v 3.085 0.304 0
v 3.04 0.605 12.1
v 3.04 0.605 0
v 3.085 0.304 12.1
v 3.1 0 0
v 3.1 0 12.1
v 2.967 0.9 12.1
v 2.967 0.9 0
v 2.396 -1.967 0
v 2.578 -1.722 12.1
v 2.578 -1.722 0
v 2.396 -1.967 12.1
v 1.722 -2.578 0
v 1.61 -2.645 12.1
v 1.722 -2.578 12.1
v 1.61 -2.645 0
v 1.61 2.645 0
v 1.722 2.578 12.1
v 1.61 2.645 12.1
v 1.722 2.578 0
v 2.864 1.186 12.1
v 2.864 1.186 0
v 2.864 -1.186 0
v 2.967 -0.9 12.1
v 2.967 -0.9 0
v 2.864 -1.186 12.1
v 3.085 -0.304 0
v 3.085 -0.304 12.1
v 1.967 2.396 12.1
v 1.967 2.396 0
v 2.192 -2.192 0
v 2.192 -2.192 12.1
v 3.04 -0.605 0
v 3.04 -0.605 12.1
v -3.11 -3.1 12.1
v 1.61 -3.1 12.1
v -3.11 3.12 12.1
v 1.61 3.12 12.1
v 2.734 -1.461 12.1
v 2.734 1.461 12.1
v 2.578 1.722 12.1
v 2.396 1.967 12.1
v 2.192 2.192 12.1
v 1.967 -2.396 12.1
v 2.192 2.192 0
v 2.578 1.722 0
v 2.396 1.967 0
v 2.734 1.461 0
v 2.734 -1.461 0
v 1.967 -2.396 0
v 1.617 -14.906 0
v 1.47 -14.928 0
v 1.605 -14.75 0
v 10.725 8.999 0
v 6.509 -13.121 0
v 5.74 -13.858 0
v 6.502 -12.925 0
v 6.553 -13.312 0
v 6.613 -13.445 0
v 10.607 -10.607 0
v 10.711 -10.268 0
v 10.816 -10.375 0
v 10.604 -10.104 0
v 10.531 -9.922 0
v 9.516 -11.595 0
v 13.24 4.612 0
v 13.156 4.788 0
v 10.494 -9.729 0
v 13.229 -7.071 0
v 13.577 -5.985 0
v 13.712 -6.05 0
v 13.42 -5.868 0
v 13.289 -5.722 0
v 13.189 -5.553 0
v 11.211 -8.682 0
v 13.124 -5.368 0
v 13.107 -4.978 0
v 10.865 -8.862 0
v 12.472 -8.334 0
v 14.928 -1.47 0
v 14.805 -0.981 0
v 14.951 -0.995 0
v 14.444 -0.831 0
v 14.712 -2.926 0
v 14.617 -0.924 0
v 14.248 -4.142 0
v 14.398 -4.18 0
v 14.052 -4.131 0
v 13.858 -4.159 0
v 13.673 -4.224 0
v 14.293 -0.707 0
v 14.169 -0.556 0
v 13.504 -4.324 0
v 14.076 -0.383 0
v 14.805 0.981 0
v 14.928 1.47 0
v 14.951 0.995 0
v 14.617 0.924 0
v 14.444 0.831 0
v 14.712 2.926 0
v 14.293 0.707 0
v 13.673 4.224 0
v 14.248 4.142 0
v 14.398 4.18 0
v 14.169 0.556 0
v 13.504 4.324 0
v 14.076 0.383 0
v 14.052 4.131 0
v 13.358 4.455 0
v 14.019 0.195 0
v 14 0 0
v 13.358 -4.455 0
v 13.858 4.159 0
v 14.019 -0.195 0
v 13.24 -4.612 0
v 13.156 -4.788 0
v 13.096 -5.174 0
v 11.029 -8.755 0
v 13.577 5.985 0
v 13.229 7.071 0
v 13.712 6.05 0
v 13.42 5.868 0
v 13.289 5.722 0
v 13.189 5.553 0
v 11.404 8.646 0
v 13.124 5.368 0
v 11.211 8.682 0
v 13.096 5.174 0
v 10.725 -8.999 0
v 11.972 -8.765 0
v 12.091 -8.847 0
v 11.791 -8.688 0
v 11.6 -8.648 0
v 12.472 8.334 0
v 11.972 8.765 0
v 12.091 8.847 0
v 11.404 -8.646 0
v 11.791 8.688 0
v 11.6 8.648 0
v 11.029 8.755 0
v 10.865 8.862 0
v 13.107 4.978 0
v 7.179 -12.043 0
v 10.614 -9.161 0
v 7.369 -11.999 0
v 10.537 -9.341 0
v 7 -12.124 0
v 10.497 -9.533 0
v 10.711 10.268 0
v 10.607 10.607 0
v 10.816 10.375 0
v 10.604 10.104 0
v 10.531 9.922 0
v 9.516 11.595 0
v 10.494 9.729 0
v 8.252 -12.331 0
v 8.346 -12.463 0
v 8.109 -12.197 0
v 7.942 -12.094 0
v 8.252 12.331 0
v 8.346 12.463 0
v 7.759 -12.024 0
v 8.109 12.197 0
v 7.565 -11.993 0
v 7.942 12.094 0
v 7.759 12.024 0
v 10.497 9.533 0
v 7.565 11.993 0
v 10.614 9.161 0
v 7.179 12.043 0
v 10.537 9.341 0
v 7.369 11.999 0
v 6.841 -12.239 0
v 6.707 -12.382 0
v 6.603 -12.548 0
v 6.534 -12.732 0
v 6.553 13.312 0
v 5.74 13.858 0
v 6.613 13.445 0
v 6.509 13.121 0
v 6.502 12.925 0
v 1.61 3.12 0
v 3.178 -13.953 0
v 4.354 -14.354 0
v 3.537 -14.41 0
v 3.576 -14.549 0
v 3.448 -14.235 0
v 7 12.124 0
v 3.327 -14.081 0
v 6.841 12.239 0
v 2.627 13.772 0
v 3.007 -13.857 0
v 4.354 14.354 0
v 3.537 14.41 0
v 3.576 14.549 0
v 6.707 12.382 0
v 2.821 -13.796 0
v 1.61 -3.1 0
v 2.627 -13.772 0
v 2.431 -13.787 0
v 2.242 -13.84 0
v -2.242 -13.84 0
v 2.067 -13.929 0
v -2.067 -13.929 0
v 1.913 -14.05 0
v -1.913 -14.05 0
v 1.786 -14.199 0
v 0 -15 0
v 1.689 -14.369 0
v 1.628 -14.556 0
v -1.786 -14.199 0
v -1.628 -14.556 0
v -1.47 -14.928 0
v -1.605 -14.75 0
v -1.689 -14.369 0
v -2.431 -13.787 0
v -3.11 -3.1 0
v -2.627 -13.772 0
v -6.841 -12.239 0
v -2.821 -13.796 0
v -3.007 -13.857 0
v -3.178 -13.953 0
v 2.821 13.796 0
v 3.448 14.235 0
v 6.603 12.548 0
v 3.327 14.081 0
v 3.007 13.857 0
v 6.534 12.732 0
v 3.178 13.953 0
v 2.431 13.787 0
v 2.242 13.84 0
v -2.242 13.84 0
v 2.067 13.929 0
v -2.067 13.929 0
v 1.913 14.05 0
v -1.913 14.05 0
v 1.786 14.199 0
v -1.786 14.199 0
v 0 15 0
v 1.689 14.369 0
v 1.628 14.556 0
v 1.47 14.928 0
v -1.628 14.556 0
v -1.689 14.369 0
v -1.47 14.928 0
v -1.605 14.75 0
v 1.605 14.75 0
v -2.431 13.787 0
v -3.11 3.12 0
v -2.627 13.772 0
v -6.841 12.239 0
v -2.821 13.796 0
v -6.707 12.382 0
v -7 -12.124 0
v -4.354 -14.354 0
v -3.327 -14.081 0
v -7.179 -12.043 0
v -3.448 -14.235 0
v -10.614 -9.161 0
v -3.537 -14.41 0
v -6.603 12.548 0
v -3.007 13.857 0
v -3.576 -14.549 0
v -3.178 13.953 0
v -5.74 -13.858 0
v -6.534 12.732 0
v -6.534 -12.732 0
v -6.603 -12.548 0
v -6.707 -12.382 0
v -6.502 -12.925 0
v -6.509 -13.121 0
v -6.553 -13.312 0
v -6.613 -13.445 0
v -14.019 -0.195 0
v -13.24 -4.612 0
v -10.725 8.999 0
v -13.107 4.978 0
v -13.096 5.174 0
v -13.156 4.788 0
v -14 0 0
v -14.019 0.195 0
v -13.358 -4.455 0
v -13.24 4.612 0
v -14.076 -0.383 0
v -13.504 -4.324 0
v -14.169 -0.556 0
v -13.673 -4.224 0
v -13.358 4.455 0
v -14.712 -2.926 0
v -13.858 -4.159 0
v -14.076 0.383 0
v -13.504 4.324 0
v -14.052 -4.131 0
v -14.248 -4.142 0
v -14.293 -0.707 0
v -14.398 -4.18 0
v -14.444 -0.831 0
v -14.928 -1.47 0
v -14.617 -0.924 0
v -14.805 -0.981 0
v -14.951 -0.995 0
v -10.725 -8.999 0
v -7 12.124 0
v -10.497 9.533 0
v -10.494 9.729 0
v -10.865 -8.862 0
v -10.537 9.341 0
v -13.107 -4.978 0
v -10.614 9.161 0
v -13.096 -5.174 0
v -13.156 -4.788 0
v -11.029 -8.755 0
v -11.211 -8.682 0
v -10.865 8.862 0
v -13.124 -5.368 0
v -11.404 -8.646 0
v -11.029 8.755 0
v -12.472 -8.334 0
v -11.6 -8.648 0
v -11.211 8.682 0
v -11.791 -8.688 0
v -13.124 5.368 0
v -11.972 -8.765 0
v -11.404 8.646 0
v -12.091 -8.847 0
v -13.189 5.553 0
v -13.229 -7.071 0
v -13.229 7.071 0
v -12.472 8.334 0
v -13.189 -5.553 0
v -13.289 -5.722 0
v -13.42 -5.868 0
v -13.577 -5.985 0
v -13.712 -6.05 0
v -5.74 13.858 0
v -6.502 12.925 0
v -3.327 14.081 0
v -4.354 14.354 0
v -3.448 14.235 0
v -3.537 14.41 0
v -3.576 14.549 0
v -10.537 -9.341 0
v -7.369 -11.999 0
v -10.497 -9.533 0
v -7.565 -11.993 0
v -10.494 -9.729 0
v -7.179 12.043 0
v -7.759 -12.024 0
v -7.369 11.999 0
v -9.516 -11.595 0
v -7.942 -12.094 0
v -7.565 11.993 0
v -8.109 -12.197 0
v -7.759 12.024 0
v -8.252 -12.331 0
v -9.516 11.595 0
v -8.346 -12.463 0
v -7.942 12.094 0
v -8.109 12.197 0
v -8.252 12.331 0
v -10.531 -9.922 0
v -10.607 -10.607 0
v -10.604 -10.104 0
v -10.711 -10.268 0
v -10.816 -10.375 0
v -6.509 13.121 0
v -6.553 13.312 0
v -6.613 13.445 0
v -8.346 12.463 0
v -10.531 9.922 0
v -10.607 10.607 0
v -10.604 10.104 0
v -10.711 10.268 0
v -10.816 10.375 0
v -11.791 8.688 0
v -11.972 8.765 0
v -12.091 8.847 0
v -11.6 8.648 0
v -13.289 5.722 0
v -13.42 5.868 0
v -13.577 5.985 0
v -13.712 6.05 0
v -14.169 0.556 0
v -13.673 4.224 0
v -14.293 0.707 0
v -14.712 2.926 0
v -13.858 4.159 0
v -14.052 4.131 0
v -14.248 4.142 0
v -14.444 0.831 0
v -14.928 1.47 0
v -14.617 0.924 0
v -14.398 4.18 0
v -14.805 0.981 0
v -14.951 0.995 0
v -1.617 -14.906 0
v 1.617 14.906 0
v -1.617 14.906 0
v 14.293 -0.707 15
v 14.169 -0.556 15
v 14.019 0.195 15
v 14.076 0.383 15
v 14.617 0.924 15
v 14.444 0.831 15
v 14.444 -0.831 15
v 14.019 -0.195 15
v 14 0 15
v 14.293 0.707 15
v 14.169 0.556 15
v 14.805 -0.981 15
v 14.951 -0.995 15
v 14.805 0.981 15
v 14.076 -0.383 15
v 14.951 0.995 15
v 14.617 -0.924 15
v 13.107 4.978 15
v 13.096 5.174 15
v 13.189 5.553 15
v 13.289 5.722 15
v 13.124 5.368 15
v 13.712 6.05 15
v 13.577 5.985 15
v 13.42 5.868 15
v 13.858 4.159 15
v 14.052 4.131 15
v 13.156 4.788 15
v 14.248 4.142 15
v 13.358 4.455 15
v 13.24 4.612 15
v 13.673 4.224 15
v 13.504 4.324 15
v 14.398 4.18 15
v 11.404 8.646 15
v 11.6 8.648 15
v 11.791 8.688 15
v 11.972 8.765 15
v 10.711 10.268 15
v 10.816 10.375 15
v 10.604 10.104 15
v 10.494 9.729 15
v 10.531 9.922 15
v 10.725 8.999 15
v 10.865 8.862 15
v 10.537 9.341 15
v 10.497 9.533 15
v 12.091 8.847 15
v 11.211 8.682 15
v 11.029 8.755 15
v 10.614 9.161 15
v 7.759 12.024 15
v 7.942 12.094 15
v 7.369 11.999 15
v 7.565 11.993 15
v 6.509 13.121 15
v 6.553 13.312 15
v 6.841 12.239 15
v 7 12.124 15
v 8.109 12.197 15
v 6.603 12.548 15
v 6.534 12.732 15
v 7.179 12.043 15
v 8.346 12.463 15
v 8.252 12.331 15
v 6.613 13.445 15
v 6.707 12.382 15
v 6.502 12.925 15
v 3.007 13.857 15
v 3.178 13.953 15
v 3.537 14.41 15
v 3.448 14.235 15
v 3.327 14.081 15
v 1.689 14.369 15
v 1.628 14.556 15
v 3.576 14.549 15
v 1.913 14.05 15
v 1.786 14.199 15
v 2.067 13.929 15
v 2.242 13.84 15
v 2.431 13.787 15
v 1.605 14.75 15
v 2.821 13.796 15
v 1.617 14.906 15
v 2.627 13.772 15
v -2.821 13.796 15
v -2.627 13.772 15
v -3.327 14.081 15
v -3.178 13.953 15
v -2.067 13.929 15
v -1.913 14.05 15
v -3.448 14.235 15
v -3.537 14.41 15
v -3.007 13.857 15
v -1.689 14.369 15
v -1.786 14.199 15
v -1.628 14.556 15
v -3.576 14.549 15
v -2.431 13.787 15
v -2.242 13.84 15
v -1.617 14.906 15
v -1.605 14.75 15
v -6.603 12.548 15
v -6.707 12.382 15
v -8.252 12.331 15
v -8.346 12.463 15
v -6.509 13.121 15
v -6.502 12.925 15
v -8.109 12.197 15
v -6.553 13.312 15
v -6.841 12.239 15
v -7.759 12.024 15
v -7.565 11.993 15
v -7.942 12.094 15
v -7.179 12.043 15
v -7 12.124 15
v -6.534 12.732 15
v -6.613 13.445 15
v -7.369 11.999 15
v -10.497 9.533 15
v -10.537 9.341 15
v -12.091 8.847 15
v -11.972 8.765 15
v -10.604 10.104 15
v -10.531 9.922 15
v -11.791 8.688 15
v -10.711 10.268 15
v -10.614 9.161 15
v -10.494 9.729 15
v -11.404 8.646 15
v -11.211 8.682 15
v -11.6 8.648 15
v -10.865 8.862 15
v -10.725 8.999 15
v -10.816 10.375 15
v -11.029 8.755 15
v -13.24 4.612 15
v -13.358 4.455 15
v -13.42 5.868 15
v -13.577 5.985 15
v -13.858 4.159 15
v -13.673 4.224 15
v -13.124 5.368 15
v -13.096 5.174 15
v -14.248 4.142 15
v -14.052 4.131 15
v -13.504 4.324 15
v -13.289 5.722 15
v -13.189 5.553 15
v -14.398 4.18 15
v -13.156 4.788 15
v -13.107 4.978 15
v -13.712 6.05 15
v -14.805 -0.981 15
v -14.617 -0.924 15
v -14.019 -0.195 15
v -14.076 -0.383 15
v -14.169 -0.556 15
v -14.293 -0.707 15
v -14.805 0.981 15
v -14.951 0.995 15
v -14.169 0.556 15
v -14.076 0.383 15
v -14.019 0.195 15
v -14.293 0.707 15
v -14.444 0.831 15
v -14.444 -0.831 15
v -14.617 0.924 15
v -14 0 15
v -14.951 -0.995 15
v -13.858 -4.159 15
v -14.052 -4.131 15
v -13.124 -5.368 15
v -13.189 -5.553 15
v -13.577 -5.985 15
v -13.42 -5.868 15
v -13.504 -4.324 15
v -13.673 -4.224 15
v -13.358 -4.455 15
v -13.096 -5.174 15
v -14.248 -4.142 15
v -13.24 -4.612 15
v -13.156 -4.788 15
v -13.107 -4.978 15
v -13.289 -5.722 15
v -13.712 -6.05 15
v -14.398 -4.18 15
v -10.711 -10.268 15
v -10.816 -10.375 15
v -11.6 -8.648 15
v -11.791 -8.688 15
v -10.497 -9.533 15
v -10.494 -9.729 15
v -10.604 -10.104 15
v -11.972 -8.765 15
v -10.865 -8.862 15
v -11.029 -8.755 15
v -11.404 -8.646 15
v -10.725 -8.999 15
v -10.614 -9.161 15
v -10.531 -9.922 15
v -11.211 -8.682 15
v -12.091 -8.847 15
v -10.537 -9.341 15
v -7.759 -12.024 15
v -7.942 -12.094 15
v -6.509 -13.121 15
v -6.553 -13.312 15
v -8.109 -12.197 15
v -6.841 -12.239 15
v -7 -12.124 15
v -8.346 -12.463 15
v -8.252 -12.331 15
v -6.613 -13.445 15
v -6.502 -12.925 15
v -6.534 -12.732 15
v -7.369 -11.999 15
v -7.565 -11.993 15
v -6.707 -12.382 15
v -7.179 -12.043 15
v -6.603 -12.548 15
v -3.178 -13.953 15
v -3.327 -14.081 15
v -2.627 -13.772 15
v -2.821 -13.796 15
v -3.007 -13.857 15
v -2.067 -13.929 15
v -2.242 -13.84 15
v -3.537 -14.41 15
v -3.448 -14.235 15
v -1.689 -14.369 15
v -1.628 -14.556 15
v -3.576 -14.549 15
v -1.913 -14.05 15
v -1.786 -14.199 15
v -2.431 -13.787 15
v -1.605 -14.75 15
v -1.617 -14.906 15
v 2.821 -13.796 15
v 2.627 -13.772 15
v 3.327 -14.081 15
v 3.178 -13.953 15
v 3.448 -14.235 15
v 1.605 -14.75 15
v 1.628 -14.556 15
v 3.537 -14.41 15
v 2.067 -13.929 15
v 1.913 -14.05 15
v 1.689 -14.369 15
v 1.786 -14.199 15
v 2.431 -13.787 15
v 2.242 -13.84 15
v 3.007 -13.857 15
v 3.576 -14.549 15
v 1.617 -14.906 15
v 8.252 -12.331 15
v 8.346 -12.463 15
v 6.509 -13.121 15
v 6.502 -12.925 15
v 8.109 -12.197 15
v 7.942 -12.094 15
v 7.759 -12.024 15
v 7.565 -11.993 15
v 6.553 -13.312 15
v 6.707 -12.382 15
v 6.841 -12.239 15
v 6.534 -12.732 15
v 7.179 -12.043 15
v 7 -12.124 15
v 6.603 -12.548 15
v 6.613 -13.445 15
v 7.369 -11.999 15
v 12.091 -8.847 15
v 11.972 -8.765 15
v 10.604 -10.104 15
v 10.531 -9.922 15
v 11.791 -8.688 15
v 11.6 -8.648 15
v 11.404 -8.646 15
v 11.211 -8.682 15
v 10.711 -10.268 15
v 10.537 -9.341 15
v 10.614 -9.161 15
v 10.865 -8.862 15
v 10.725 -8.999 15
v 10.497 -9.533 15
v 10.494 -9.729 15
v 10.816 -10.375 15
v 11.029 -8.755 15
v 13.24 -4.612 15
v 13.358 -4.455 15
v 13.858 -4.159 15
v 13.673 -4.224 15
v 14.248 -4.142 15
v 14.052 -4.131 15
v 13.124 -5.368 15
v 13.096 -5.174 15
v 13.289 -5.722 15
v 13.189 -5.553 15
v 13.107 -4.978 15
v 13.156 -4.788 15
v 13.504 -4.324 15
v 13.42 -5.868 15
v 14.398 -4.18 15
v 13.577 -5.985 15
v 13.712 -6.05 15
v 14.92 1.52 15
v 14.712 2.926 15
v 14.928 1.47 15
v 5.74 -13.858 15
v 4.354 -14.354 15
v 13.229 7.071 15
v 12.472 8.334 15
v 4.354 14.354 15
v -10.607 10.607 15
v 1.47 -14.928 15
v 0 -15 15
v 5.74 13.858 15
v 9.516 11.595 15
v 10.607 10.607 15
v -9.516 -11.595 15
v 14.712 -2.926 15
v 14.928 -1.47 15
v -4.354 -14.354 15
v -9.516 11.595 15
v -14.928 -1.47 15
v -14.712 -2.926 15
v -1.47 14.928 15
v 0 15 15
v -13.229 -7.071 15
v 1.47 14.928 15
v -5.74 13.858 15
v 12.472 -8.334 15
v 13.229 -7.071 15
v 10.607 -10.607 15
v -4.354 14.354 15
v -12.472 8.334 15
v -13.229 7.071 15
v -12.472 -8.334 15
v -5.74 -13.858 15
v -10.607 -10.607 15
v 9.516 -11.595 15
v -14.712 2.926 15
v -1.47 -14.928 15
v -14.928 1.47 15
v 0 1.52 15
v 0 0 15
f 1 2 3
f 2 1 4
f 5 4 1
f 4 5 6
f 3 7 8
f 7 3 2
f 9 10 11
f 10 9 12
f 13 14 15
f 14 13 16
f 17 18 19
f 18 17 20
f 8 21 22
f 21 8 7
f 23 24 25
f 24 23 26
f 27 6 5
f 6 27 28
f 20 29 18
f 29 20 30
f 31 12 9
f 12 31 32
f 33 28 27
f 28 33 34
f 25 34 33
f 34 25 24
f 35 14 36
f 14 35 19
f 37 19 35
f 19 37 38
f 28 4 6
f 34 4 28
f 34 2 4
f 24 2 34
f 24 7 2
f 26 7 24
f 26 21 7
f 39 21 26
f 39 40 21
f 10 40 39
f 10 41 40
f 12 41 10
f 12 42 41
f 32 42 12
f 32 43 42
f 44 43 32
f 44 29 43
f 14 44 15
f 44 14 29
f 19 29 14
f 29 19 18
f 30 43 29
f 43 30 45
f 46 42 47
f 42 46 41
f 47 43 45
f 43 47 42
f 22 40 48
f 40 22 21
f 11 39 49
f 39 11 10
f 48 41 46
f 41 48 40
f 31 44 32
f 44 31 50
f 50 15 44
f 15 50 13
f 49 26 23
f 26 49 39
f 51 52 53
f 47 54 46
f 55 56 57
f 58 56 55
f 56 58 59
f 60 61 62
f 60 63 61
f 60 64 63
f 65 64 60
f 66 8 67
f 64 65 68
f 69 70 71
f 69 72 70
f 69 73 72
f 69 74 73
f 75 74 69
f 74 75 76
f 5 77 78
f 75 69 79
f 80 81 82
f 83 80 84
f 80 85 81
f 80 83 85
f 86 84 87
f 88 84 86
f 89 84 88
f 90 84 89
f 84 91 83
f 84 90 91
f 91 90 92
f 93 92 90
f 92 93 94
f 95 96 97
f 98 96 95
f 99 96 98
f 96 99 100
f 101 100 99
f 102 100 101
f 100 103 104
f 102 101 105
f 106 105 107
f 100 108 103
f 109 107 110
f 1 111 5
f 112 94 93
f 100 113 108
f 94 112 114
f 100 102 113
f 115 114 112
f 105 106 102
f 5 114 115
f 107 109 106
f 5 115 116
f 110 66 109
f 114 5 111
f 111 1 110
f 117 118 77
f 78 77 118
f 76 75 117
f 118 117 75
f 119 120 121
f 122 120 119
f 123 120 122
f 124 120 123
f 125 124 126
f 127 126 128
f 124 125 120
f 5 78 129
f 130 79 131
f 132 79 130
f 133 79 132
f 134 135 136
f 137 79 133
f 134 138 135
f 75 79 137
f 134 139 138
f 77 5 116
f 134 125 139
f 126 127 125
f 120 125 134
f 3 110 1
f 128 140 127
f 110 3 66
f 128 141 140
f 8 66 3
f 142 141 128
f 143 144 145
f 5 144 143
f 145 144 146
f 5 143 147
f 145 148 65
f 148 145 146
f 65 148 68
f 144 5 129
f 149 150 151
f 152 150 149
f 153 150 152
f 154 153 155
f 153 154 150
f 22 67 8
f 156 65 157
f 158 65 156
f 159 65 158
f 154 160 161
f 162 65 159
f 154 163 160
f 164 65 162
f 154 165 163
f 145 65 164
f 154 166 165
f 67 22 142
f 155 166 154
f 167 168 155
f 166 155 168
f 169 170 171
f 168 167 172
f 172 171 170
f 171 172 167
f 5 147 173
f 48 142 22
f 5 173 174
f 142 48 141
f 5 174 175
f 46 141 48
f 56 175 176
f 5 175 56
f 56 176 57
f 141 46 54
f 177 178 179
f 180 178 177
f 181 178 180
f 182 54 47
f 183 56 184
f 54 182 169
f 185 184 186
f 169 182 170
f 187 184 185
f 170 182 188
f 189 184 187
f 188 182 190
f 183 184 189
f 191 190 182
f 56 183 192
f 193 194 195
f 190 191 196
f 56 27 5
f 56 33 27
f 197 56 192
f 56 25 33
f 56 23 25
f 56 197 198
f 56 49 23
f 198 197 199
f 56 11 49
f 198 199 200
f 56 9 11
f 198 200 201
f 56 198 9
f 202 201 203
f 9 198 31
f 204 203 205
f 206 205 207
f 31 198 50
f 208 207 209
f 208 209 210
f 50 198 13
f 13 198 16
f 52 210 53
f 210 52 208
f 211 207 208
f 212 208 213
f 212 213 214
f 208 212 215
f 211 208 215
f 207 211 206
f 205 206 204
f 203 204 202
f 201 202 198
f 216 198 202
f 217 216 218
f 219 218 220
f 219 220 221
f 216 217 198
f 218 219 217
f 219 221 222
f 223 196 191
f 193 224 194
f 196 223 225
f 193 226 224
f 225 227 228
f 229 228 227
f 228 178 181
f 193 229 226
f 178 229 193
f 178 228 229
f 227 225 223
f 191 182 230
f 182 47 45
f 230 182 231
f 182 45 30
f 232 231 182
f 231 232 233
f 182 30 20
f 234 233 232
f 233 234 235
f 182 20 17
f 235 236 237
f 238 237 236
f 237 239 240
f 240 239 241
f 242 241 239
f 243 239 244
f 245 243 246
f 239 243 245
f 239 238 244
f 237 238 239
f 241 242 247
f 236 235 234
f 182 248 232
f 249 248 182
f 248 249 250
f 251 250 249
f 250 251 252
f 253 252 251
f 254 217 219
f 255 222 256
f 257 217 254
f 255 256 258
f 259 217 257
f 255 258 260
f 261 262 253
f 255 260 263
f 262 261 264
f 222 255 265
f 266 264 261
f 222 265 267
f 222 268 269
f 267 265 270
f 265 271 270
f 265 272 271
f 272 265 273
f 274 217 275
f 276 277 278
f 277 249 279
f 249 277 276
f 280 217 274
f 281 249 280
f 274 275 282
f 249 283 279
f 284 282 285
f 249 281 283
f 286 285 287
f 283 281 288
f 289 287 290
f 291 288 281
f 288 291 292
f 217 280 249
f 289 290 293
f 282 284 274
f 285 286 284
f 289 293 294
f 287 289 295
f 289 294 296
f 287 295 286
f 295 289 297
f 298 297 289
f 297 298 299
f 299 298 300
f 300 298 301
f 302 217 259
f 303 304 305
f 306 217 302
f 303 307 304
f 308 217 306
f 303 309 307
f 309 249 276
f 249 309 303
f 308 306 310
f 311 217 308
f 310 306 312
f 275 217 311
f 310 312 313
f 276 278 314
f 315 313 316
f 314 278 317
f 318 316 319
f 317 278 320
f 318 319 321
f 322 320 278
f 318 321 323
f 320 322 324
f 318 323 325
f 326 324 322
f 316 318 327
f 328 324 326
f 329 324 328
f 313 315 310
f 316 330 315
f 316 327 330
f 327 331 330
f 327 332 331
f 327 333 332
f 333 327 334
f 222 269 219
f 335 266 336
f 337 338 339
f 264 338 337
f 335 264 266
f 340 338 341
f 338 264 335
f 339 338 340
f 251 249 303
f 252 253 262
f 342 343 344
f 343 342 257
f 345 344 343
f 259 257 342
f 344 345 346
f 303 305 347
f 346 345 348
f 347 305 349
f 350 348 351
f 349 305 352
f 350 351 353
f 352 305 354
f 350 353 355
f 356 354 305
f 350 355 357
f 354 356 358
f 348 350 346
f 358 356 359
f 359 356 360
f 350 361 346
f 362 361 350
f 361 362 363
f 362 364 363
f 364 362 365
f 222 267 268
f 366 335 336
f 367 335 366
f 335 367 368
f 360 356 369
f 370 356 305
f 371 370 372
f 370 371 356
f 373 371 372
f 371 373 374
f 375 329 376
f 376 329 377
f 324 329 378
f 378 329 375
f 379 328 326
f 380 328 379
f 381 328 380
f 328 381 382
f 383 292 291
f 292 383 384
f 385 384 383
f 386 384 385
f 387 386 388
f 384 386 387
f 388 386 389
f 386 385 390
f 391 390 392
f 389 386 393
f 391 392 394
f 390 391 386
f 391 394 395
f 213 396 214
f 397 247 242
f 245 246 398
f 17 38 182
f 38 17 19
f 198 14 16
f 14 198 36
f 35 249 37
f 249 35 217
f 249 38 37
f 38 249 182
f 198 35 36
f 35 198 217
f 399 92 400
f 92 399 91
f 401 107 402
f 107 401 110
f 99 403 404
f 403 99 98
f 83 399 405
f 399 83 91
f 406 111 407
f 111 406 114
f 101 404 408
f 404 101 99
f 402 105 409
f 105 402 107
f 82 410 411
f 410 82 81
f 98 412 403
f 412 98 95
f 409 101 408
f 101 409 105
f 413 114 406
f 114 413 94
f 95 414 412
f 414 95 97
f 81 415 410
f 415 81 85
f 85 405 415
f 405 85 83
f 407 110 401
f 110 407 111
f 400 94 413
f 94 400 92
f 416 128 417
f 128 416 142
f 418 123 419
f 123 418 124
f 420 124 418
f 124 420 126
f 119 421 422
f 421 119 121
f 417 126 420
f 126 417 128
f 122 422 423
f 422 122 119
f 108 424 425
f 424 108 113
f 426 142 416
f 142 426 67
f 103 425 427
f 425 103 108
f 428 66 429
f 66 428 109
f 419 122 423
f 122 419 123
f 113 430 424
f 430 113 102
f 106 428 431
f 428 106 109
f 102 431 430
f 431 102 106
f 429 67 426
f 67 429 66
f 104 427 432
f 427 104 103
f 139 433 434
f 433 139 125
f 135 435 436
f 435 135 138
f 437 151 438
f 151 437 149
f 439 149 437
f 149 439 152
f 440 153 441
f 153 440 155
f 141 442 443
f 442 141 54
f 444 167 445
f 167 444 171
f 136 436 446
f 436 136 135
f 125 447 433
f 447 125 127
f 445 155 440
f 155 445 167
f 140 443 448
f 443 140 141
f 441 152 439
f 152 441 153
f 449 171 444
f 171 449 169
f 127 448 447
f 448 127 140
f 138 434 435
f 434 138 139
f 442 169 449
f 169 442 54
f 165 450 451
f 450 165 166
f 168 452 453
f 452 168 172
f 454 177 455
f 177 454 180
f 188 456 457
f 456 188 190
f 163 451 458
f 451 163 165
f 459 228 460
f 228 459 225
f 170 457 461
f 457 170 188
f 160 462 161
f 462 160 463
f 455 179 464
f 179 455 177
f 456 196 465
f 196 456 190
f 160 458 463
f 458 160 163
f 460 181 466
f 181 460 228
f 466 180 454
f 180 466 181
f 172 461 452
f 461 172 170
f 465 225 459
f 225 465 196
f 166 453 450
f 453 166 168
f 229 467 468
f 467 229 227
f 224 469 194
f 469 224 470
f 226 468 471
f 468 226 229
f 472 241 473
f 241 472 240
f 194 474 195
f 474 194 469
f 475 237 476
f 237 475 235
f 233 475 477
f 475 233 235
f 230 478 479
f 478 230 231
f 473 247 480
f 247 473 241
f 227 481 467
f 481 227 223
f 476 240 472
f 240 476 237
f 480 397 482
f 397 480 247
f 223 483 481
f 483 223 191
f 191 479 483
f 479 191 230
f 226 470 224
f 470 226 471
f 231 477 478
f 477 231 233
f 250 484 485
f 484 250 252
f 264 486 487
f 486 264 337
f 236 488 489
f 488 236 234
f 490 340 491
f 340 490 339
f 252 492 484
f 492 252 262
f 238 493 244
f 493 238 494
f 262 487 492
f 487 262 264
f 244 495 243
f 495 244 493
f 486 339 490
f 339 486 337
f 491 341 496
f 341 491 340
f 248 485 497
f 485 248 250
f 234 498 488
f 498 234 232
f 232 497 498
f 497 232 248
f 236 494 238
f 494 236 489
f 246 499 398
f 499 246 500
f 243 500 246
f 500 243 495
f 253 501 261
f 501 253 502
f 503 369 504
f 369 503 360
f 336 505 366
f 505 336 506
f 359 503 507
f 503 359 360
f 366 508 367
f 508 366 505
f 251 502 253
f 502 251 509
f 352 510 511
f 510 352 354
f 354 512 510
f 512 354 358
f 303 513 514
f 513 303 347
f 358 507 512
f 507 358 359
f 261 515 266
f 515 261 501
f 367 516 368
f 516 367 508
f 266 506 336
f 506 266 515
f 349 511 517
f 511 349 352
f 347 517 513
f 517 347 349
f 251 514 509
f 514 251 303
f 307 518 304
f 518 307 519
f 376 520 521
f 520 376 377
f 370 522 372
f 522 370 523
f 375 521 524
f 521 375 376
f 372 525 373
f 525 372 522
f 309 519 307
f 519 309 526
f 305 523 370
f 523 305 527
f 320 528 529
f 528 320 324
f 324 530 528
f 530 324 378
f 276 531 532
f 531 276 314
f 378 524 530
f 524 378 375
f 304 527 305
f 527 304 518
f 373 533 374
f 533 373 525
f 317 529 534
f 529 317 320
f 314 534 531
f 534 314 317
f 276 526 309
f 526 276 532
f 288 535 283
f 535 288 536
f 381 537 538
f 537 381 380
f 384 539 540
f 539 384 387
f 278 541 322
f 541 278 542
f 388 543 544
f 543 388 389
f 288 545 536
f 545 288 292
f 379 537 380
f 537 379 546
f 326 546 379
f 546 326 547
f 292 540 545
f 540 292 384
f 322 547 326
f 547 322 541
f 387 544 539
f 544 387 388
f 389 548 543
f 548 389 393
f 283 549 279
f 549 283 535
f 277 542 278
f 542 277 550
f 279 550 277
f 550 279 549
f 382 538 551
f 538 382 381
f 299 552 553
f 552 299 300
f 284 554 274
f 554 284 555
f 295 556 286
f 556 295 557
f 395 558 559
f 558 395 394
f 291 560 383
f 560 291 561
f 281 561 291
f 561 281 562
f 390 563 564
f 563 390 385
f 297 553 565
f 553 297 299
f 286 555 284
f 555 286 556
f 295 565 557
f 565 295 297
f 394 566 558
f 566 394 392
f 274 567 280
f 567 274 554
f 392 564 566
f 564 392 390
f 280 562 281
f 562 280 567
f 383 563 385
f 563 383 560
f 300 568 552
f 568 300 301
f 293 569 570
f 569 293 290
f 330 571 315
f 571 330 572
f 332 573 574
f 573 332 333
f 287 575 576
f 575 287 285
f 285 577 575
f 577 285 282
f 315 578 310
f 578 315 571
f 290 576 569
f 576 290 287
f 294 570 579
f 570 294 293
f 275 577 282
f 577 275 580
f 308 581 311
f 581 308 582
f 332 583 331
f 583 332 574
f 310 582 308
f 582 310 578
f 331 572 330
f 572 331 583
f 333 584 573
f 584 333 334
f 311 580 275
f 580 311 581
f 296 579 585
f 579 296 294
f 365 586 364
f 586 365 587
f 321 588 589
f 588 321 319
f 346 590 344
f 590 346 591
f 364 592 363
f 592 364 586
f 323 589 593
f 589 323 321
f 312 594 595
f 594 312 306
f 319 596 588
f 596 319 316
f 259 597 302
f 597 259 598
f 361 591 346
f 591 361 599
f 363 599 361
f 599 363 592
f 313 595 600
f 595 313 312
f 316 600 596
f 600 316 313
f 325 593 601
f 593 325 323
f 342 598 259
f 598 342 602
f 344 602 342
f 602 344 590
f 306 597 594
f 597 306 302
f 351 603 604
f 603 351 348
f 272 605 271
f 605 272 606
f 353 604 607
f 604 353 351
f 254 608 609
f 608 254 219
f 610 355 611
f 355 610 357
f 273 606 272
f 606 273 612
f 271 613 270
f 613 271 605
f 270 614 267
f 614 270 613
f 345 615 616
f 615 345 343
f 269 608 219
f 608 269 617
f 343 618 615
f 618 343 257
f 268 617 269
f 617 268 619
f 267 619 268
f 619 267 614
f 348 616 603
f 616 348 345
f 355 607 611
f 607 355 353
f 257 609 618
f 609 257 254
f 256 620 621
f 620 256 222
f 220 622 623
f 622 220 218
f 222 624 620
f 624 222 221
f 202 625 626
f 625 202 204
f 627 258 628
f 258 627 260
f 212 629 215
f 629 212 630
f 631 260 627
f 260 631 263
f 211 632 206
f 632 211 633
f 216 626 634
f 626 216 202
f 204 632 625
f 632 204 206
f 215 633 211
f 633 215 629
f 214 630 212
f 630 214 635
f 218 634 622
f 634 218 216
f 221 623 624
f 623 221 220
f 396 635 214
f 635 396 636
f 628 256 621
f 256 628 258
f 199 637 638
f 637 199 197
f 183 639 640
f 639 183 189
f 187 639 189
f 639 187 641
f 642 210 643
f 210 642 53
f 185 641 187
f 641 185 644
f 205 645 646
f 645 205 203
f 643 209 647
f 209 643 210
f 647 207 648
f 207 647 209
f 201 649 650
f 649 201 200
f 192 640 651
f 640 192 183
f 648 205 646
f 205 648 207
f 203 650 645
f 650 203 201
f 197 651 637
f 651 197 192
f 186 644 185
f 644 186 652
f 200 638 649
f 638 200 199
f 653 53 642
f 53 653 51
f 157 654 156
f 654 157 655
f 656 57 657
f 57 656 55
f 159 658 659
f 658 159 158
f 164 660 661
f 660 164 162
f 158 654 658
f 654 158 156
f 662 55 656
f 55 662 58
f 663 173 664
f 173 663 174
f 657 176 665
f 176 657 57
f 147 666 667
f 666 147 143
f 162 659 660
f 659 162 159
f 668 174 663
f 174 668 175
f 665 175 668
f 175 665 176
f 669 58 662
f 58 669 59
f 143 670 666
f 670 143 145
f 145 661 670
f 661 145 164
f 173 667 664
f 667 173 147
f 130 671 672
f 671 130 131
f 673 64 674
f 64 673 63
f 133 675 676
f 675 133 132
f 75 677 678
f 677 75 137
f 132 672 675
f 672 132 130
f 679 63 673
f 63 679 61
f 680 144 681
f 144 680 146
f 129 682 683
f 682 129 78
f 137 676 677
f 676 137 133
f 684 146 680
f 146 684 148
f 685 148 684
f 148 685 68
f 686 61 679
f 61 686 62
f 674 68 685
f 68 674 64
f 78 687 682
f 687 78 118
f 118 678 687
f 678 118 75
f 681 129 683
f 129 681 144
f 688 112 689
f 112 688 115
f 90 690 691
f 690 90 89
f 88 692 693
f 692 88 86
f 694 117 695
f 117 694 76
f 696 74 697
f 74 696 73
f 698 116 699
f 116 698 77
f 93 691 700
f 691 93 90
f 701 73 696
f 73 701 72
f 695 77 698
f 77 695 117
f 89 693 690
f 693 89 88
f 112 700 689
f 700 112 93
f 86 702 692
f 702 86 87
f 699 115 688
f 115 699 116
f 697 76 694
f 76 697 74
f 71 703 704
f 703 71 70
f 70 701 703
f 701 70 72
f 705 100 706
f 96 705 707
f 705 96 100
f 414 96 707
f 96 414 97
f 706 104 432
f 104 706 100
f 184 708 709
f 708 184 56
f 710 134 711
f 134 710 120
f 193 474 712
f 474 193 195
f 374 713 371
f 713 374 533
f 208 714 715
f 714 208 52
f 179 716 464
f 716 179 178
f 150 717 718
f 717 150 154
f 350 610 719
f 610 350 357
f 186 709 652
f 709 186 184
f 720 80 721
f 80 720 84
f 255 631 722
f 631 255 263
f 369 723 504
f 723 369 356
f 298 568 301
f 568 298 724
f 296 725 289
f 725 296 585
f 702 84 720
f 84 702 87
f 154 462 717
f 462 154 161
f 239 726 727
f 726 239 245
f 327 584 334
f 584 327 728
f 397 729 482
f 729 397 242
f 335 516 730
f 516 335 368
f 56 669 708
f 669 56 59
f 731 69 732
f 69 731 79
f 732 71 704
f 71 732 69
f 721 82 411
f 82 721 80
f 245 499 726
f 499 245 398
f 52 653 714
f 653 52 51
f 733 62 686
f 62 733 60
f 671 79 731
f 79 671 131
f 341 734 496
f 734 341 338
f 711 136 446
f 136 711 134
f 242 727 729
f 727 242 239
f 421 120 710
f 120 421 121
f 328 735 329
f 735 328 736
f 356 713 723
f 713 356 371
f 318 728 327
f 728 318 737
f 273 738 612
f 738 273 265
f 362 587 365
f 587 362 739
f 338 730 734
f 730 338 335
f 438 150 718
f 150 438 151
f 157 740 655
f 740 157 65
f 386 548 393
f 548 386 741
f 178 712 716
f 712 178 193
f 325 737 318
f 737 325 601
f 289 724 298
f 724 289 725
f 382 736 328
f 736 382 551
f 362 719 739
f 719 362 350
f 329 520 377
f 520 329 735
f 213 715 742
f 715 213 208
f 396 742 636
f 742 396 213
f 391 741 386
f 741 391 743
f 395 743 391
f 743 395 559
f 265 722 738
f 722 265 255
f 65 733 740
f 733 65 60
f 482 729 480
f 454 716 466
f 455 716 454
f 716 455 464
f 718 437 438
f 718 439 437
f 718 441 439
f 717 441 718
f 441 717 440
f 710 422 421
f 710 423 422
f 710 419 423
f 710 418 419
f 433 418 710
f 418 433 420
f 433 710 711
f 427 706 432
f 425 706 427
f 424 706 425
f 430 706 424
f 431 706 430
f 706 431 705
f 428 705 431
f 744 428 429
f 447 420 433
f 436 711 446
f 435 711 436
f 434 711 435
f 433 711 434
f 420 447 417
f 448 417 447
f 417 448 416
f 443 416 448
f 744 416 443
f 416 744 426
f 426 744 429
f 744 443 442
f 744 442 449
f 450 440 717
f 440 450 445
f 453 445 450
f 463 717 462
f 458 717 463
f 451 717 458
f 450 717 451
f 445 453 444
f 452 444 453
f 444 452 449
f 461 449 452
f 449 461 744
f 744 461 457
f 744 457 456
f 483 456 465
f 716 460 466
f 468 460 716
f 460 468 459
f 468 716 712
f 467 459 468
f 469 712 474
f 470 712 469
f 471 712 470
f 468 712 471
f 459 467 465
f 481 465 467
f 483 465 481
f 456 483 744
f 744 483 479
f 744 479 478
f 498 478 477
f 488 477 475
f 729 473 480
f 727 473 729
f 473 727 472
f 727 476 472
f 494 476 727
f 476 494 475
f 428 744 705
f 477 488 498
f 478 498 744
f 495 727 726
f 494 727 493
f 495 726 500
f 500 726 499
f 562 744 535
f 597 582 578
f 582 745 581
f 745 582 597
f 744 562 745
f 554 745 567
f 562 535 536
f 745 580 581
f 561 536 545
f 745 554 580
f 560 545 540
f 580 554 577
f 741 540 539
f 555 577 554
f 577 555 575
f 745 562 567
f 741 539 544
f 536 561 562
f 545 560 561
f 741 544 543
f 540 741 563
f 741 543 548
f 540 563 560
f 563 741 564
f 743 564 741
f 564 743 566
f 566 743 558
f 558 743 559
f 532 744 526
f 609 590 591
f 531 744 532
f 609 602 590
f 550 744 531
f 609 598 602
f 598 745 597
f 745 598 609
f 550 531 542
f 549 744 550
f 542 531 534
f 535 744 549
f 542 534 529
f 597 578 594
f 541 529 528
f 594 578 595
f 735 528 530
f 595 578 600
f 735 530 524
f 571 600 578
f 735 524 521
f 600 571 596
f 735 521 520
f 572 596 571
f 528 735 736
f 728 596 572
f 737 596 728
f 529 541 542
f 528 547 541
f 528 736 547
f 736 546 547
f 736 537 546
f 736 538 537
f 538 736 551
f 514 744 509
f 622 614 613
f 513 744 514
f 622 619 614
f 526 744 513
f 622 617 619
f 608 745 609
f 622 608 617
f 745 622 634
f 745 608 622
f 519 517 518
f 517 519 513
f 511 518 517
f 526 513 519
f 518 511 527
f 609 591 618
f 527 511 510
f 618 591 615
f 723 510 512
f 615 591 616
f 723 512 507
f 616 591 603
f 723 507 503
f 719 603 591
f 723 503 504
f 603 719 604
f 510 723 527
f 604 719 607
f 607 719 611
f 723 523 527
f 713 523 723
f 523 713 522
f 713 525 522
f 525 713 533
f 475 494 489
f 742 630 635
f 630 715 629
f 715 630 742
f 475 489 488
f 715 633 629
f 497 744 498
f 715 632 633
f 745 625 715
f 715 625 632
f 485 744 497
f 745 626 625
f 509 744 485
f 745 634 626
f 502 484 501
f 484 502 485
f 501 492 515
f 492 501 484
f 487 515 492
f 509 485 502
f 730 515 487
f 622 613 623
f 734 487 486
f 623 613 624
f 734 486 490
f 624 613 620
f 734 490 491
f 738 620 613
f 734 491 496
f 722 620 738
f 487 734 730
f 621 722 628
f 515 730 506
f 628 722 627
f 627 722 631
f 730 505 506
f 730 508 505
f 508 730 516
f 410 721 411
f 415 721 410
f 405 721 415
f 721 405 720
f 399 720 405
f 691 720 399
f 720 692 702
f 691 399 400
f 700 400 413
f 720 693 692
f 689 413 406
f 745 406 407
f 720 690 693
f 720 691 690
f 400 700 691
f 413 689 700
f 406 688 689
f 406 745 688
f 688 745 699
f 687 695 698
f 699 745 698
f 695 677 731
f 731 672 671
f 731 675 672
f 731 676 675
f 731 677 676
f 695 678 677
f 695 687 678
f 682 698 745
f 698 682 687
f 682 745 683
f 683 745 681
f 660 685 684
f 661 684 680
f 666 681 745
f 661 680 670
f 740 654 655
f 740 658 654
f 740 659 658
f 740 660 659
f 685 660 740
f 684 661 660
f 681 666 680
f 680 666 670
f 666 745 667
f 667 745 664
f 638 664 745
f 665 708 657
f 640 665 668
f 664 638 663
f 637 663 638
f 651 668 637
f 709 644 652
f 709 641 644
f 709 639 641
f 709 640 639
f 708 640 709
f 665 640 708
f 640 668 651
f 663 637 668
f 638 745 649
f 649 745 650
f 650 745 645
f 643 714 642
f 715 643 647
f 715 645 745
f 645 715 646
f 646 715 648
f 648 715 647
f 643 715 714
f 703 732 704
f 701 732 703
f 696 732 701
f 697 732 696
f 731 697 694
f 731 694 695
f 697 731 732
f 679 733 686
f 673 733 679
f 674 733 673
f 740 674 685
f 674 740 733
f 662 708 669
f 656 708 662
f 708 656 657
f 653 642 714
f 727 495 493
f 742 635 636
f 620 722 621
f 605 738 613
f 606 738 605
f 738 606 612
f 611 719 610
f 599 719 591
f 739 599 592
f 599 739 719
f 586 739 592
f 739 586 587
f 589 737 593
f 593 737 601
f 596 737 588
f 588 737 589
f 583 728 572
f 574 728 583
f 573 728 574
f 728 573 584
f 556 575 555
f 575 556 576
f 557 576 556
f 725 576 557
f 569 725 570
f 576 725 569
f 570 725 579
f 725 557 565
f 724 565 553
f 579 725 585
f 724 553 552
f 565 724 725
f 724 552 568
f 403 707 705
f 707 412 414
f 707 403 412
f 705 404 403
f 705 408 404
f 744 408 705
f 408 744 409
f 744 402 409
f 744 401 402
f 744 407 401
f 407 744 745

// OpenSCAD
// Replacement knob for hotplate stirrer
// D-shaft: 6mm nominal, 6.2mm bore diameter, 4.7mm width (flat-to-arc)
// Knob: 30mm diameter, 15mm tall
// Print orientation: Bottom face (z=0) rests on bed.

// --- Dimensions ---
knob_diameter = 30;
knob_height = 15;
bore_diameter = 6.2;
bore_width = 4.7; // Distance from flat to opposite arc
bore_depth = 12;
grip_groove_diameter = 2;
num_grip_grooves = 18;
pointer_groove_width = 1.5;
pointer_groove_depth = 1;

// --- Calculated Values ---
knob_radius = knob_diameter / 2;
bore_radius = bore_diameter / 2;

// Calculate position of the flat face of the D-bore.
// The distance from the flat to the far side of the circle is 4.7mm.
// The total diameter is 6.2mm.
// Width = Distance from flat to far arc.
// Let x be distance from center to flat.
// Width = x + radius.
// x = Width - radius = 4.7 - 3.1 = 1.6mm.
// So the flat is at x = -1.6 (if flat is on the left/negative side).
flat_offset = bore_width - bore_radius; // 1.6

// --- Main Model ---
difference() {
    // 1. Outer Cylinder
    cylinder(r = knob_radius, h = knob_height, center = false, $fn = 64);

    // 2. D-Shaped Blind Bore
    // The bore is 12mm deep, starting from z=0.
    // It consists of a circular hole with one side flattened.
    // We cut a cylinder, then cut a box to create the flat.
    
    // Cut the circular part of the bore
    // Extend slightly past z=12 to ensure clean cut
    translate([0, 0, 0]) {
        cylinder(r = bore_radius, h = bore_depth + 0.1, center = false, $fn = 64);
        
        // Cut the flat side
        // The flat is on the negative X side.
        // The flat face is at x = -flat_offset = -1.6.
        // We cut a box that covers the left part of the bore.
        // Box X range: from -bore_radius to -flat_offset (plus margin)
        // Box Y range: -bore_radius to bore_radius
        // Box Z range: 0 to bore_depth
        translate([-bore_radius - 0.01, -bore_radius, 0]) {
            cube([
                (bore_radius + flat_offset) + 0.02, // Width: from far left to flat, plus margin
                2 * bore_radius + 0.02,             // Height in Y
                bore_depth + 0.1                      // Height in Z
            ], center = false);
        }
    }

    // 3. Grip Grooves
    // 18 evenly spaced vertical grooves on the outer surface.
    // Each is a 2mm diameter half-cylinder.
    // "Half-cylinder centred on the outer surface" implies the groove profile is a semi-circle.
    // We cut a cylinder of radius 1mm (diameter 2mm) from the surface.
    // To make it a "half-cylinder" groove, we subtract a cylinder of radius 1mm.
    // Since the center is on the surface, half the cylinder is inside the part (the groove)
    // and half is outside (which is removed by the difference anyway).
    // So we just subtract a cylinder of r=1, h=knob_height, centered at the surface.
    
    for (i = [0 : num_grip_grooves - 1]) {
        angle = i * 360 / num_grip_grooves;
        
        // Position on the surface
        px = knob_radius * cos(angle);
        py = knob_radius * sin(angle);
        
        translate([px, py, 0]) {
            // Rotate to align the cylinder axis radially
            rotate([0, 0, angle]) {
                // Cut the groove
                // The cylinder axis is now along the X-axis (radial direction)
                // We cut a cylinder of radius 1mm.
                // To ensure it cuts cleanly, we make it slightly longer than the knob height.
                cylinder(r = grip_groove_diameter / 2, h = knob_height + 0.1, center = false, $fn = 32);
            }
        }
    }

    // 4. Pointer Groove
    // 1.5mm wide, 1mm deep, on the top face.
    // Runs from the center to the outer edge.
    // On the same side as the flat of the D (negative X side).
    // We cut a rectangular slot from z=15 down to z=14.
    // It runs from x=0 to x=knob_radius.
    // Width is 1.5mm, so it spans y from -0.75 to 0.75.
    
    translate([0, 0, knob_height]) {
        // Cut the slot
        // X: from 0 to knob_radius (plus margin to ensure it reaches the edge)
        // Y: -0.75 to 0.75 (plus margin)
        // Z: 0 to 1mm deep (plus margin)
        translate([0, 0, 0]) {
            cube([
                knob_radius + 0.01, // Length: center to edge
                pointer_groove_width + 0.02, // Width
                pointer_groove_depth + 0.01  // Depth
            ], center = false);
        }
    }
}
